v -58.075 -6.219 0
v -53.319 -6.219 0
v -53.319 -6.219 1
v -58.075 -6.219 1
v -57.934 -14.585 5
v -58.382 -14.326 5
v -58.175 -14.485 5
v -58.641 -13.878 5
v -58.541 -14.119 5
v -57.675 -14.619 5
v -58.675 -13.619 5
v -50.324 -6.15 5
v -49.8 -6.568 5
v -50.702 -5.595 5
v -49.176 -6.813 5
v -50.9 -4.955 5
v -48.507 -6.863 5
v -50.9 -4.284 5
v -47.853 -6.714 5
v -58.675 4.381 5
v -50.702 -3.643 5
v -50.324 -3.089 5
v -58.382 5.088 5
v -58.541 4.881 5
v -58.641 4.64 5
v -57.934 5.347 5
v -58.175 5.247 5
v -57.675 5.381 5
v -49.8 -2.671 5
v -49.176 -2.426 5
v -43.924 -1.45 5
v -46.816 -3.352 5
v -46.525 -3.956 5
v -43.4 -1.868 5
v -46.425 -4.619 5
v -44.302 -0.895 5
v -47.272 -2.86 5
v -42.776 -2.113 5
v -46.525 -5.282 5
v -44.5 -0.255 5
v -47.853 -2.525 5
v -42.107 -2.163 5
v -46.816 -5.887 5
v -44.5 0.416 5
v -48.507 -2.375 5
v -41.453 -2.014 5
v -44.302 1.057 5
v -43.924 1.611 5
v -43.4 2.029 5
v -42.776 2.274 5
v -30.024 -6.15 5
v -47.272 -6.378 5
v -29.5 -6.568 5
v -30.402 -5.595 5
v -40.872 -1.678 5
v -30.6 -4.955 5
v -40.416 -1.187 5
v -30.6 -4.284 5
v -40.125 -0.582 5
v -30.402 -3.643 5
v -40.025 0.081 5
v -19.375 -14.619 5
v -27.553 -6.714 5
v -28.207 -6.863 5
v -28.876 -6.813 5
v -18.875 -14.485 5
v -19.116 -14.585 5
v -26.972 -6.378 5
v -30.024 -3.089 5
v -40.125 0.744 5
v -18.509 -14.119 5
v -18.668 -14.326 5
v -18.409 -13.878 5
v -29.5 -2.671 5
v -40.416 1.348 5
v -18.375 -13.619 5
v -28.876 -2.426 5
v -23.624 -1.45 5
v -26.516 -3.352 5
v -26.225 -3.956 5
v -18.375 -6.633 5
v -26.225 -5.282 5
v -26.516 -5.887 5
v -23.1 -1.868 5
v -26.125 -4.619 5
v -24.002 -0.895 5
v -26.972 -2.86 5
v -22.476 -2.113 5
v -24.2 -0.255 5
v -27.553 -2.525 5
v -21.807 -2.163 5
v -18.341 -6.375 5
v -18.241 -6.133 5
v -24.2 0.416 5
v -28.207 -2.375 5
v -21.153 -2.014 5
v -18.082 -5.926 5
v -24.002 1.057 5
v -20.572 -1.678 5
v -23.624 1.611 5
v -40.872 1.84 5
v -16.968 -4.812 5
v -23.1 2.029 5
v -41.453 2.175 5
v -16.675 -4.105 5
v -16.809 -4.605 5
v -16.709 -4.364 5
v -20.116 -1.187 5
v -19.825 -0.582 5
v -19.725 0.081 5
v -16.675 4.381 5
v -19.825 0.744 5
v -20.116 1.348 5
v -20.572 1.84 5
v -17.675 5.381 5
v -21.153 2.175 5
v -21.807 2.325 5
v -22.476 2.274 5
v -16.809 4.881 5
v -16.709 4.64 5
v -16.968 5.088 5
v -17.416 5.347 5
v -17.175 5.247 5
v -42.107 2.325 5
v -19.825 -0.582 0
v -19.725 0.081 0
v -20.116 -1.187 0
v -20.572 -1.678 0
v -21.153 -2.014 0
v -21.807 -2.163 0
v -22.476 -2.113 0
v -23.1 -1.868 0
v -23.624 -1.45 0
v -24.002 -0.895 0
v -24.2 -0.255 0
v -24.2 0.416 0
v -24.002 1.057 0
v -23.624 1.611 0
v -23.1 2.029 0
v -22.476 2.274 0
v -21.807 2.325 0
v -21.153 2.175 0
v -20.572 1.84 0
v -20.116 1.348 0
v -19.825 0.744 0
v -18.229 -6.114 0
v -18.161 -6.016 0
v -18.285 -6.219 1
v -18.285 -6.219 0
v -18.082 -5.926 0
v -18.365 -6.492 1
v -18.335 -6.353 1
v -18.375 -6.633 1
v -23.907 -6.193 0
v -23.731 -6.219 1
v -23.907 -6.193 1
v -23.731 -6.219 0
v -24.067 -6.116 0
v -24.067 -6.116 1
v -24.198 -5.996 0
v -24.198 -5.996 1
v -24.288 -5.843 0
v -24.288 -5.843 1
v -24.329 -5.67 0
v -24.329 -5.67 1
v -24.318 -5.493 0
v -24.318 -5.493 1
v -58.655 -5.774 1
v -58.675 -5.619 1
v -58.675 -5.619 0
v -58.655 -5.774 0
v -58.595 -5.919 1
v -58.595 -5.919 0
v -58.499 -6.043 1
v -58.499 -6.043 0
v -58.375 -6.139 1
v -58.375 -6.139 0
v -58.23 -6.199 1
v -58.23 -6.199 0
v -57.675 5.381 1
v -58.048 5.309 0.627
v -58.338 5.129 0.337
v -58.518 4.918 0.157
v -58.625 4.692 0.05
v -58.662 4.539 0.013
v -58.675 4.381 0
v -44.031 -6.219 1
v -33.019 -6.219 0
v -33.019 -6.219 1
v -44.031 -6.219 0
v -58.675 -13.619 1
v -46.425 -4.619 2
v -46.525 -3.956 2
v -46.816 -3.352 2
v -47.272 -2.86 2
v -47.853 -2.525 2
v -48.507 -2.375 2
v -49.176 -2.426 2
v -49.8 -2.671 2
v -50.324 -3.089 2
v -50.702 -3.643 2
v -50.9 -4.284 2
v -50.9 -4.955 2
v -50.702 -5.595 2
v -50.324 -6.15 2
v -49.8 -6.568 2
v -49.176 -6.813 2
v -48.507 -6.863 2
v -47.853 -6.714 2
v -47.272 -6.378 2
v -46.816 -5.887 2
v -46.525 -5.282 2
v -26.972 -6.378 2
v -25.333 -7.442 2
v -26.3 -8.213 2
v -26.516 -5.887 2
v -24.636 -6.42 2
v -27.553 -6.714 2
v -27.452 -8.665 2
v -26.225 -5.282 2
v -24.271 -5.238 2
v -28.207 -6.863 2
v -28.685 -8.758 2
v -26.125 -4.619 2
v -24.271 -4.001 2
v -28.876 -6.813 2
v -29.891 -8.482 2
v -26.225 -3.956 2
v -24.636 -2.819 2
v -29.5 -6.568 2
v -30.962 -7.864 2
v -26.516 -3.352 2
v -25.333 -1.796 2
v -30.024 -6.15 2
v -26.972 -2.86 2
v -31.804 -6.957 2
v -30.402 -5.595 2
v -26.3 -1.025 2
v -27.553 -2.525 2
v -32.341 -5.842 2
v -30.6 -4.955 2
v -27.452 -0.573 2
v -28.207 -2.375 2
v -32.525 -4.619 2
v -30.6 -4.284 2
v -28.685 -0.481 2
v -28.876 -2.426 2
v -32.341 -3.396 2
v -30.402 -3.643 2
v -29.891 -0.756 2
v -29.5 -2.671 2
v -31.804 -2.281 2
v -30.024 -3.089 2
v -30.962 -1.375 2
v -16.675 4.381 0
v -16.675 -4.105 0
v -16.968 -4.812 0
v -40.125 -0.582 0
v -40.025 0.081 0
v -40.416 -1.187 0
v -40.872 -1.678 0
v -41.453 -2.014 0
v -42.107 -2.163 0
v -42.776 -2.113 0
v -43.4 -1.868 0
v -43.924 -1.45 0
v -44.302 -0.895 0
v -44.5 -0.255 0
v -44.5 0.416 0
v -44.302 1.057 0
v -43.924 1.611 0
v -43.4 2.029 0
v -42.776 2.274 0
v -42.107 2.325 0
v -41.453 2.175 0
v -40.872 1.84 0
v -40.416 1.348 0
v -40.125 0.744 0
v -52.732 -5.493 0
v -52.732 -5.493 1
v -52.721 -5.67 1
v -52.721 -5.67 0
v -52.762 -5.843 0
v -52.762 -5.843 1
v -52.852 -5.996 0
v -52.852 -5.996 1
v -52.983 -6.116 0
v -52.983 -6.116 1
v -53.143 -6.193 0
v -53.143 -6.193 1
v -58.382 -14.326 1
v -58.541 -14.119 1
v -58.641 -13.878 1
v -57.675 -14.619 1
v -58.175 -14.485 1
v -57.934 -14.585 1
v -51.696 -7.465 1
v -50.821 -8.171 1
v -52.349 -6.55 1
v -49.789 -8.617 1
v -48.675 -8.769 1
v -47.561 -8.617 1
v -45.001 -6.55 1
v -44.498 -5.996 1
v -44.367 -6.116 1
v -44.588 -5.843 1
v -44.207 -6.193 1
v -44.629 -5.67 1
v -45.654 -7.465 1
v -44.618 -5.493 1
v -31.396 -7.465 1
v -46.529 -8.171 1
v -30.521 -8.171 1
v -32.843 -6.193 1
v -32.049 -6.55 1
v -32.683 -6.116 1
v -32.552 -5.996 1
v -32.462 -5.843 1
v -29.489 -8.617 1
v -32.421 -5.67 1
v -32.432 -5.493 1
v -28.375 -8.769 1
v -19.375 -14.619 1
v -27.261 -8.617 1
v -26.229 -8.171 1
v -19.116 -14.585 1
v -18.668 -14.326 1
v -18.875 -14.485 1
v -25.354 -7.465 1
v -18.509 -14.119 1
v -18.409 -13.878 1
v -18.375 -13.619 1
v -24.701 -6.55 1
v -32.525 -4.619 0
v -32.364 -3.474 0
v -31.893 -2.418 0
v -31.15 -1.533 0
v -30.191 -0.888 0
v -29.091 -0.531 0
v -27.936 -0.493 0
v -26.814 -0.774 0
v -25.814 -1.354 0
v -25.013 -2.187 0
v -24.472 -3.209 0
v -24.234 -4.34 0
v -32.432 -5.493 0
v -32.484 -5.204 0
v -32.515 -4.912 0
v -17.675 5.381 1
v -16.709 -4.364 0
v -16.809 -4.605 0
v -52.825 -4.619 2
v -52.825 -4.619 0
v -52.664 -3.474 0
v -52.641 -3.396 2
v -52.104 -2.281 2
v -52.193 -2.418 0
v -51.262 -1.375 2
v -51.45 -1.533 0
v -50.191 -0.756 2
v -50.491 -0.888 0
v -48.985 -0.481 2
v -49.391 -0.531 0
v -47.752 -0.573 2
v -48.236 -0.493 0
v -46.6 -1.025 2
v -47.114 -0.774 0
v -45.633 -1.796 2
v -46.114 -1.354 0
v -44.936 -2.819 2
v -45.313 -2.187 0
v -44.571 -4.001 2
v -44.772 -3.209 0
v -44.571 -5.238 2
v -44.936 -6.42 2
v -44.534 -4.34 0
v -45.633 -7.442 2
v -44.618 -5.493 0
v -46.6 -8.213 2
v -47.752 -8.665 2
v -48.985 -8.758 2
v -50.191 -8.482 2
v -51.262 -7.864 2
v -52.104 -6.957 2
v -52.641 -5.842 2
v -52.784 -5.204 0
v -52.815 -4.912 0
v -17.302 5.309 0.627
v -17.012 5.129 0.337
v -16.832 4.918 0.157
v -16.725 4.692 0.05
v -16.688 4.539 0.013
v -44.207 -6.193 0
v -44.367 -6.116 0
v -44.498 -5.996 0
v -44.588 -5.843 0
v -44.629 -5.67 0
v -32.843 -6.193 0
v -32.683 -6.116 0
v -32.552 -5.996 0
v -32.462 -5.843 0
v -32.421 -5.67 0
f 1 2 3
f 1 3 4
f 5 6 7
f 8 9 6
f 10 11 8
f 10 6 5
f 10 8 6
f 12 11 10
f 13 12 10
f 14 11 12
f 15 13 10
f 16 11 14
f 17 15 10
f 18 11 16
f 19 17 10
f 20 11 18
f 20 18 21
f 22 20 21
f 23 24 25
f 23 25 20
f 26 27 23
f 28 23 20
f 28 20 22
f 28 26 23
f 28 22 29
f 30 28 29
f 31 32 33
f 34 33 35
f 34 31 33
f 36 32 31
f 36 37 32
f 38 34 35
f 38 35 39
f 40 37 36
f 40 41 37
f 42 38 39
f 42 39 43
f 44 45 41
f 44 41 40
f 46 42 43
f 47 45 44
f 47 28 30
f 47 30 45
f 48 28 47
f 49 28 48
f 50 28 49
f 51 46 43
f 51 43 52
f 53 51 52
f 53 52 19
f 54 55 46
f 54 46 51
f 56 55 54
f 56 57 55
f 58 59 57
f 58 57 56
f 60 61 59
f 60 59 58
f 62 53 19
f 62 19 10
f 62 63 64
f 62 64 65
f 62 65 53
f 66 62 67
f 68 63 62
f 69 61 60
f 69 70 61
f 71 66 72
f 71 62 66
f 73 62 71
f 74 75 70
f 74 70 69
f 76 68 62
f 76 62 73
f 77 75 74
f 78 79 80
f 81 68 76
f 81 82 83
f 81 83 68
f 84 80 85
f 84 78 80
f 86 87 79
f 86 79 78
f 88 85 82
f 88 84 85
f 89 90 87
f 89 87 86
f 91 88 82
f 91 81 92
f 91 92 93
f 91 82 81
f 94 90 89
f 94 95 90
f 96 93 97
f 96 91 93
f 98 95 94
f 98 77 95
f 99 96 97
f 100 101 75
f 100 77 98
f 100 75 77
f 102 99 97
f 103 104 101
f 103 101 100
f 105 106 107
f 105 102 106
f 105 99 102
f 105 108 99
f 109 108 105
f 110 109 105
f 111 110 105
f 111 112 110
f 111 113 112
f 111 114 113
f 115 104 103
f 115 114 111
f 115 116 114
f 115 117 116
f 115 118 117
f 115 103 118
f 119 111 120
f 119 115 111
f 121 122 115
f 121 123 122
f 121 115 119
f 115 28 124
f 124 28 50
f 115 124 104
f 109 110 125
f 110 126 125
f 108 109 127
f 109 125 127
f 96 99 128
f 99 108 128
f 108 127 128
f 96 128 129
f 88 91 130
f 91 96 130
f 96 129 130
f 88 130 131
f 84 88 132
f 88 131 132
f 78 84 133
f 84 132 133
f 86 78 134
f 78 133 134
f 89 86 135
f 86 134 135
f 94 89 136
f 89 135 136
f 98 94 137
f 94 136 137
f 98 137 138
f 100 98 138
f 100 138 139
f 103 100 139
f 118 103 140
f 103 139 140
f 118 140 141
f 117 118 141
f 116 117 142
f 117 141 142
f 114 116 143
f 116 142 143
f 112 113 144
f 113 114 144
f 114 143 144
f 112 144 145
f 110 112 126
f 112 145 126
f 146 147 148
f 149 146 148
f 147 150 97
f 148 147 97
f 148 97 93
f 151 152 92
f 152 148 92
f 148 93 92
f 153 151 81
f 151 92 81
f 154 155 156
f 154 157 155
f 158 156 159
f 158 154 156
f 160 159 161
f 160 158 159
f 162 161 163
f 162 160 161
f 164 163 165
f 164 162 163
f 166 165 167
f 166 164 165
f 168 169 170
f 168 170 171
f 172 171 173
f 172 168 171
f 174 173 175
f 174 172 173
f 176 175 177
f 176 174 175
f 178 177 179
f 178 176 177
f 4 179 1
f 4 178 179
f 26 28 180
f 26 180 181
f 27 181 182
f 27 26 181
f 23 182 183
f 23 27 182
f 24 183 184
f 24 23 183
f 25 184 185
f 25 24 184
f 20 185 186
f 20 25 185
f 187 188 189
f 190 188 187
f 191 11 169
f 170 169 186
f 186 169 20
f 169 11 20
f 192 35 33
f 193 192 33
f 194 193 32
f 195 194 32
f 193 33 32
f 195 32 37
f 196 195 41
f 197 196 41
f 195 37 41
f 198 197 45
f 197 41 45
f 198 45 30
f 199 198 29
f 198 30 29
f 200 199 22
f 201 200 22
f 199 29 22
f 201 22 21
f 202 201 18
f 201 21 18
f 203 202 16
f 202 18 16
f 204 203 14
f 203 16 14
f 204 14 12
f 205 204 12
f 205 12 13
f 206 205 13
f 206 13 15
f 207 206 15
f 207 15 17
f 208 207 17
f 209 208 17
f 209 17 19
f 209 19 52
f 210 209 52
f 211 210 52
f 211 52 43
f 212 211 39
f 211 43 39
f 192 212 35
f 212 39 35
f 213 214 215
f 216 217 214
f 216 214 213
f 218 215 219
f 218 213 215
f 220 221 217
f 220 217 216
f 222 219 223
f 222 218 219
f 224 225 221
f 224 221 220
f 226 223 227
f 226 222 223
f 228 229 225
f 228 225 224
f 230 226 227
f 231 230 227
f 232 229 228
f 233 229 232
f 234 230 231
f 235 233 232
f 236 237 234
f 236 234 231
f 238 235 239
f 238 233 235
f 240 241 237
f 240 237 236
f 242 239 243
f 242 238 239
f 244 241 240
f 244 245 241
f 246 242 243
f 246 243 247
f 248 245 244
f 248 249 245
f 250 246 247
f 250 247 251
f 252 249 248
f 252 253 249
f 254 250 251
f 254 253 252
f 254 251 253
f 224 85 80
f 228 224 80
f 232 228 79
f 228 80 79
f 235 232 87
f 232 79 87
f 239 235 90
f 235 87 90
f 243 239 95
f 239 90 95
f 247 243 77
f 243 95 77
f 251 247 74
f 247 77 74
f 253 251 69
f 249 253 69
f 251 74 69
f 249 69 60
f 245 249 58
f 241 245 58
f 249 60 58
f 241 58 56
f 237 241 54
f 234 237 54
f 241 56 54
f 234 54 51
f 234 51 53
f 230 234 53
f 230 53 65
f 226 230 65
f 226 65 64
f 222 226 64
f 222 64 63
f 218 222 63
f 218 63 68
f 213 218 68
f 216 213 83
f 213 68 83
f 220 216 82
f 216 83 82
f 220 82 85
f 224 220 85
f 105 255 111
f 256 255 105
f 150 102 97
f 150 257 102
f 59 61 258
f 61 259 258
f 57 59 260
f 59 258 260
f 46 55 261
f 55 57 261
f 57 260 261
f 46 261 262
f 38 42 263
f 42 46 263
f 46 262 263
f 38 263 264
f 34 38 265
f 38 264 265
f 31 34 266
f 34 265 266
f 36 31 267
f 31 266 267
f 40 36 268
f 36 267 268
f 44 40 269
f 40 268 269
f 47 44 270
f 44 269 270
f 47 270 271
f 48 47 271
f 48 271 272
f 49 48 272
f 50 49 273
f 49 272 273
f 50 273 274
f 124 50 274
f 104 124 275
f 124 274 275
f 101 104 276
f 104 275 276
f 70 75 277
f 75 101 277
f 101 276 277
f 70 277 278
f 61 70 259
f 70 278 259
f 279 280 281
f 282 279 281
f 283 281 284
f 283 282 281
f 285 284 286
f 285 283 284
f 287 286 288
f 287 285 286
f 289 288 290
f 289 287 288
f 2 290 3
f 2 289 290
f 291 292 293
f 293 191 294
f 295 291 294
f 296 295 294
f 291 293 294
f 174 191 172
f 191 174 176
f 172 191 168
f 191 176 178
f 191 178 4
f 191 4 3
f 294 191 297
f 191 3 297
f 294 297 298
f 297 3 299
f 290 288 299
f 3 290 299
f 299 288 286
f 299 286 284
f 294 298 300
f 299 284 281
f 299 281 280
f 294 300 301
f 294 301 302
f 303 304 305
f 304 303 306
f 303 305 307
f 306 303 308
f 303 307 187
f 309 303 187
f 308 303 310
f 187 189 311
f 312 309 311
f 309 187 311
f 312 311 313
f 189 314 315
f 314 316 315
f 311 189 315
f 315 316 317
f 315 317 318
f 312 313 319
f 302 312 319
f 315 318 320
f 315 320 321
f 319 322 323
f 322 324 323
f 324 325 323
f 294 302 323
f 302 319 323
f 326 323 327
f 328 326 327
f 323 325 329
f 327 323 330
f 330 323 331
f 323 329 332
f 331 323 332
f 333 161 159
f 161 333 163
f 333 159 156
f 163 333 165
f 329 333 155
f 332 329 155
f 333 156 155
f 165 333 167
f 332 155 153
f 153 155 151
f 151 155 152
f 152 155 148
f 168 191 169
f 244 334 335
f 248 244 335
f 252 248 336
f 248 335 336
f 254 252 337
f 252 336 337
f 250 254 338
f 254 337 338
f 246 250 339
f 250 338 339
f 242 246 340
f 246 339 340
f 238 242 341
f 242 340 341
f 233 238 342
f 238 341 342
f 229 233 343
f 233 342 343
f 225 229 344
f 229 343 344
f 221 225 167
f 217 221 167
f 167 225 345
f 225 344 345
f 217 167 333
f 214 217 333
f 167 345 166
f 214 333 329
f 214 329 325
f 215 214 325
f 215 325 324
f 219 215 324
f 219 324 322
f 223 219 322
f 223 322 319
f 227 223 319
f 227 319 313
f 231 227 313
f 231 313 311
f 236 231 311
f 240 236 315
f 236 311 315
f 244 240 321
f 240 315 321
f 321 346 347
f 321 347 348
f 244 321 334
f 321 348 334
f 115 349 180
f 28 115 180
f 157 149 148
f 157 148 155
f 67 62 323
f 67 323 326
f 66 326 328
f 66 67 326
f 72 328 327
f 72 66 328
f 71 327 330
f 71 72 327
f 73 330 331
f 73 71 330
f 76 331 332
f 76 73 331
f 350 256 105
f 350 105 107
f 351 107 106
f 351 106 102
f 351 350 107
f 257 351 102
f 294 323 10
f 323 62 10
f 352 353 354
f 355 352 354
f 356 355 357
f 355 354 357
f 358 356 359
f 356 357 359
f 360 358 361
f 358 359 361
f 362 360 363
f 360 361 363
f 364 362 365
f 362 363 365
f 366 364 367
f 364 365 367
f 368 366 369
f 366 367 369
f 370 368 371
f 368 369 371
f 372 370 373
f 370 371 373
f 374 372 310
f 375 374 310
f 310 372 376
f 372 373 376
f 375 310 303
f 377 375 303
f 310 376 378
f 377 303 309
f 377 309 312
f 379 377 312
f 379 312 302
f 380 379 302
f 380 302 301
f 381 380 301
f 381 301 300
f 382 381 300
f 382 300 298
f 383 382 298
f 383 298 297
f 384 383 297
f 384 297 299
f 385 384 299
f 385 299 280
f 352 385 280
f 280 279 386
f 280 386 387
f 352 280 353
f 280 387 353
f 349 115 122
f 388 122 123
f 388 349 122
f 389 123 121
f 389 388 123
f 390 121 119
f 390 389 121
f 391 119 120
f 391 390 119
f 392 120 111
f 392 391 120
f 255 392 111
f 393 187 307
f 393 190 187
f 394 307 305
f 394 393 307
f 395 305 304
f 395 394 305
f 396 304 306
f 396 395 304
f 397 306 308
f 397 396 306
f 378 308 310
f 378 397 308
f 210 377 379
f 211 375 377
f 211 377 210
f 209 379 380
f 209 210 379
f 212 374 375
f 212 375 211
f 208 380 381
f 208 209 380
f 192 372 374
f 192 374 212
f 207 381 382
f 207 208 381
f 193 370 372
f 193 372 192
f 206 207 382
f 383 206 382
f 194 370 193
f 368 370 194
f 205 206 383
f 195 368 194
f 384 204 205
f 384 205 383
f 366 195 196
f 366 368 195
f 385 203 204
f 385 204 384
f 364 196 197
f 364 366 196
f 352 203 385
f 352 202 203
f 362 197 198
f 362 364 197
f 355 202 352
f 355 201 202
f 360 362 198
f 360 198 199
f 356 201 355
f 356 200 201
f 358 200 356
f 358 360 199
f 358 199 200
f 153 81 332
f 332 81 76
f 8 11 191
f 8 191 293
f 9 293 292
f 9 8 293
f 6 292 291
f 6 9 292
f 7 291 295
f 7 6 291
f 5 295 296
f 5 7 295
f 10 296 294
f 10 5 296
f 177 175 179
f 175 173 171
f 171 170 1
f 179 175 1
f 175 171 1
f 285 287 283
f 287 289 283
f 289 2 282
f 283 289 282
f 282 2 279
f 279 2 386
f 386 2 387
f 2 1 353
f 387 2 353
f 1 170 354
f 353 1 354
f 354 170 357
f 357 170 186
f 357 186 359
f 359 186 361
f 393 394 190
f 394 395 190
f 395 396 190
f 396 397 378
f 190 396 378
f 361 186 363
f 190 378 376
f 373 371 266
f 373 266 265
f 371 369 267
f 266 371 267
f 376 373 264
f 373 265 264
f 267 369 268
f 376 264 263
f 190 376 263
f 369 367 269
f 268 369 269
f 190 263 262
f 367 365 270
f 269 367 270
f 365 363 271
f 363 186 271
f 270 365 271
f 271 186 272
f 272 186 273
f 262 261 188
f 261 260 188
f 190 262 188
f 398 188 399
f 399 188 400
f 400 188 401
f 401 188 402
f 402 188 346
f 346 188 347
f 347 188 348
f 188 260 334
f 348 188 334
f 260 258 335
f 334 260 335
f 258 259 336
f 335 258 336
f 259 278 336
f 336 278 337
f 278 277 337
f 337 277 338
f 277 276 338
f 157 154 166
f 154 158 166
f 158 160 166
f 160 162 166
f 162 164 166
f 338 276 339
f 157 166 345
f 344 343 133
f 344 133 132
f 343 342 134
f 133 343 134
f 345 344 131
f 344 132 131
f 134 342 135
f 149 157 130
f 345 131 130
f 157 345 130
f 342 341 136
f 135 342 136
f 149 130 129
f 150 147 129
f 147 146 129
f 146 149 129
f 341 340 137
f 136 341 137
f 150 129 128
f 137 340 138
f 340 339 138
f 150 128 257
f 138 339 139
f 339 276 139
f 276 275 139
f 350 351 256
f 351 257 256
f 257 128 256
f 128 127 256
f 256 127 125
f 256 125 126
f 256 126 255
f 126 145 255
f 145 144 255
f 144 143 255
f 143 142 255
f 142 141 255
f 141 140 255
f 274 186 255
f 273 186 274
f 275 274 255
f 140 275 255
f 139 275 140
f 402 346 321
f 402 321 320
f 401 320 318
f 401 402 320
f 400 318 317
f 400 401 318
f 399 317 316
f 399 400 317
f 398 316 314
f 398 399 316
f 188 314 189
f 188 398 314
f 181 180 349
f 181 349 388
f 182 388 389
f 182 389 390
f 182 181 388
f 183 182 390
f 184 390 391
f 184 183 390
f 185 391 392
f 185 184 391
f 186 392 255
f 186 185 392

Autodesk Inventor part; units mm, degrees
ref_plane "YZ Plane" through (0, 0, 0) normal (1, 0, 0) x (0, 1, 0)
ref_plane "XZ Plane" through (0, 0, 0) normal (0, 1, 0) x (-1, 0, 0)
ref_plane "XY Plane" through (0, 0, 0) normal (0, 0, 1) x (1, 0, 0)
sketch "スケッチ1" plane through (0, 0, 0) normal (0, 0, 1) x (1, 0, 0)
  arc A0 (-17.9, -5.9192) -> (-17.6, -6.2192) centre (-17.6, -5.9192) ccw construction
  line L0 (-17.6, -6.2192) -> (-11.8244, -6.2192) construction
  line L1 (-11.8244, -6.2192) -> (-9.5, -2.219) projected
  arc A1 (-9.2172, -2.0192) -> (-9.5, -2.219) centre (-9.2172, -2.3192) ccw projected
  line L2 (-9.2172, -2.0192) -> (-6.9328, -2.0192) projected
  arc A2 (-6.65, -2.219) -> (-6.9328, -2.0192) centre (-6.9328, -2.3192) ccw projected
  line L3 (-6.65, -2.219) -> (-4.3256, -6.2192) projected
  line L4 (-4.3256, -6.2192) -> (8.4756, -6.2192) construction
  line L5 (8.4756, -6.2192) -> (10.8, -2.219) projected
  arc A3 (11.0828, -2.0192) -> (10.8, -2.219) centre (11.0828, -2.3192) ccw projected
  line L6 (11.0828, -2.0192) -> (13.3672, -2.0192) projected
  arc A4 (13.65, -2.219) -> (13.3672, -2.0192) centre (13.3672, -2.3192) ccw projected
  line L7 (13.65, -2.219) -> (15.9744, -6.2192) projected
  line L8 (15.9744, -6.2192) -> (21.25, -6.2192) construction
  arc A5 (21.25, -6.2192) -> (21.55, -5.9192) centre (21.25, -5.9192) ccw construction
  line L9 (21.55, -2.3692) -> (21.55, -5.9192) construction
  arc A6 (21.55, -2.3692) -> (21.25, -2.0692) centre (21.25, -2.3692) ccw construction
  line L10 (21.25, -2.0692) -> (17.65, -2.0692) construction
  arc A7 (17.65, 2.2308) -> (17.65, -2.0692) centre (17.65, 0.0808) ccw construction
  line L11 (17.65, 2.2308) -> (21.25, 2.2308) construction
  arc A8 (21.25, 2.2308) -> (21.55, 2.5308) centre (21.25, 2.5308) ccw construction
  line L12 (21.55, 4.8808) -> (21.55, 2.5308) construction
  line L13 (21.55, 4.8808) -> (-17.9, 4.8808) construction
  line L14 (-17.9, 4.8808) -> (-17.9, -5.9192) construction
  line L15 (1.3, 1.9308) -> (1.3, -1.7692) construction
  arc A9 (1, -2.0692) -> (1.3, -1.7692) centre (1, -1.7692) ccw construction
  line L16 (1, -2.0692) -> (-2.5, -2.0692) construction
  arc A10 (-2.5, 2.2308) -> (-2.5, -2.0692) centre (-2.5, 0.0808) ccw construction
  line L17 (-2.5, 2.2308) -> (1, 2.2308) construction
  arc A11 (1.3, 1.9308) -> (1, 2.2308) centre (1, 1.9308) ccw construction
  line L18 (-17.9, 5.3808) -> (21.55, 5.3808) construction
  circle A12 centre (-0.85, 0.0808) radius 2.15 construction
  line L19 (-0.85, 0.0808) -> (-2.5, 0.0808) construction
  circle A13 centre (-1.675, 0.0808) radius 2.25
  line L20 (64.025, 2.5048) -> (64.025, 91.3712) construction
  line L21 (-65.975, 91.3712) -> (-65.975, 2.5048) construction
  line L22 (64.025, 5.3808) -> (-65.975, 5.3808)
  circle A14 centre (18.625, 0.0808) radius 2.25
  circle A15 centre (38.925, 0.0808) radius 2.25
  circle A16 centre (59.225, 0.0808) radius 2.25
  circle A17 centre (-21.975, 0.0808) radius 2.25
  circle A18 centre (-1.675, 0.0808) radius 2.25
  circle A19 centre (18.625, 0.0808) radius 2.25
  circle A20 centre (38.925, 0.0808) radius 2.25
  circle A21 centre (-42.275, 0.0808) radius 2.25
  circle A22 centre (-21.975, 0.0808) radius 2.25
  circle A23 centre (-1.675, 0.0808) radius 2.25
  circle A24 centre (18.625, 0.0808) radius 2.25
  circle A25 centre (-62.575, 0.0808) radius 2.25
  circle A26 centre (-42.275, 0.0808) radius 2.25
  circle A27 centre (-21.975, 0.0808) radius 2.25
  circle A28 centre (-1.675, 0.0808) radius 2.25
  line L23 (64.025, 5.3808) -> (64.025, -6.2192)
  line L24 (64.025, -6.2192) -> (-65.975, -6.2192)
  line L25 (-65.975, -6.2192) -> (-65.975, 5.3808)
  point P0 (0, 0)
  dimension "d1" = 4.5
  dimension "d4" = 20.3
  dimension "d7" = 20.3
extrude "押し出し1" add sketch "スケッチ1" along normal blind 5 contours L24 L25 L22 L23 L7 A4 L6 A3 L5 L3 A2 L2 A1 L1 | L1 A1 L2 A2 L3 L24 | L5 A3 L6 A4 L7 L24 | A16 | A25
sketch "スケッチ3" plane through (0, 0, 0) normal (0, 0, -1) x (-1, 0, 0)
  line L0 (9.5, -2.219) -> (11.8244, -6.2192) projected
  arc A0 (9.5, -2.219) -> (9.2172, -2.0192) centre (9.2172, -2.3192) ccw projected
  line L1 (6.9328, -2.0192) -> (9.2172, -2.0192) projected
  arc A1 (6.9328, -2.0192) -> (6.65, -2.219) centre (6.9328, -2.3192) ccw projected
  line L2 (4.3256, -6.2192) -> (6.65, -2.219) projected
  line L3 (65.975, -6.2192) -> (-64.025, -6.2192) projected
  point P0 (0, 0)
extrude "押し出し2" cut sketch "スケッチ3" against normal through all
pattern_linear "矩形状パターン1" count 4 spacing 20.3 along (1, 0, 0) count 3 spacing 20.3 along (-1, 0, 0) of "押し出し2"
fillet "フィレット1" radius 1 1 edges at (-0.975, 5.3808, 0)
sketch "スケッチ7" plane through (0, 0, 5) normal (0, 0, 1) x (1, 0, 0)
  line L0 (-52.4244, -6.2192) -> (-50.1, -2.219) projected
  arc A0 (-49.8172, -2.0192) -> (-50.1, -2.219) centre (-49.8172, -2.3192) ccw projected
  line L1 (-49.8172, -2.0192) -> (-47.5328, -2.0192) projected
  arc A1 (-47.25, -2.219) -> (-47.5328, -2.0192) centre (-47.5328, -2.3192) ccw projected
  line L2 (-47.25, -2.219) -> (-44.9256, -6.2192) projected
  line L3 (-32.1244, -6.2192) -> (-29.8, -2.219) projected
  arc A2 (-29.5172, -2.0192) -> (-29.8, -2.219) centre (-29.5172, -2.3192) ccw projected
  line L4 (-29.5172, -2.0192) -> (-27.2328, -2.0192) projected
  arc A3 (-26.95, -2.219) -> (-27.2328, -2.0192) centre (-27.2328, -2.3192) ccw projected
  line L5 (-26.95, -2.219) -> (-24.6256, -6.2192) projected
  line L6 (-11.8244, -6.2192) -> (-9.5, -2.219) projected
  arc A4 (-9.2172, -2.0192) -> (-9.5, -2.219) centre (-9.2172, -2.3192) ccw projected
  line L7 (-9.2172, -2.0192) -> (-6.9328, -2.0192) projected
  arc A5 (-6.65, -2.219) -> (-6.9328, -2.0192) centre (-6.9328, -2.3192) ccw projected
  line L8 (-6.65, -2.219) -> (-4.3256, -6.2192) projected
  line L9 (8.4756, -6.2192) -> (10.8, -2.219) projected
  arc A6 (11.0828, -2.0192) -> (10.8, -2.219) centre (11.0828, -2.3192) ccw projected
  line L10 (11.0828, -2.0192) -> (13.3672, -2.0192) projected
  arc A7 (13.65, -2.219) -> (13.3672, -2.0192) centre (13.3672, -2.3192) ccw projected
  line L11 (13.65, -2.219) -> (15.9744, -6.2192) projected
  line L12 (28.7756, -6.2192) -> (31.1, -2.219) projected
  arc A8 (31.3828, -2.0192) -> (31.1, -2.219) centre (31.3828, -2.3192) ccw projected
  line L13 (31.3828, -2.0192) -> (33.6672, -2.0192) projected
  arc A9 (33.95, -2.219) -> (33.6672, -2.0192) centre (33.6672, -2.3192) ccw projected
  line L14 (33.95, -2.219) -> (36.2744, -6.2192) projected
  line L15 (49.0756, -6.2192) -> (51.4, -2.219) projected
  arc A10 (51.6828, -2.0192) -> (51.4, -2.219) centre (51.6828, -2.3192) ccw projected
  line L16 (51.6828, -2.0192) -> (53.9672, -2.0192) projected
  arc A11 (54.25, -2.219) -> (53.9672, -2.0192) centre (53.9672, -2.3192) ccw projected
  line L17 (54.25, -2.219) -> (56.5744, -6.2192) projected
  line L18 (-52.4244, -6.2192) -> (-44.9256, -6.2192)
  line L19 (-24.6256, -6.2192) -> (-26.95, -2.219) projected
  line L20 (-32.1244, -6.2192) -> (-24.6256, -6.2192)
  line L21 (-9.5, -2.219) -> (-11.8244, -6.2192) projected
  line L22 (-11.8244, -6.2192) -> (-4.3256, -6.2192)
  line L23 (15.9744, -6.2192) -> (8.4756, -6.2192)
  line L24 (36.2744, -6.2192) -> (33.95, -2.219) projected
  line L25 (28.7756, -6.2192) -> (36.2744, -6.2192)
  line L26 (49.0756, -6.2192) -> (56.5744, -6.2192)
  point P0 (0, 0)
extrude "押し出し5" add sketch "スケッチ7" against normal blind 4
sketch "スケッチ8" plane through (0, 0, 5) normal (0, 0, 1) x (1, 0, 0)
  circle A0 centre (-42.275, 0.0808) radius 2.25 projected
  circle A1 centre (-21.975, 0.0808) radius 2.25 projected
  line L0 (-42.275, 0.0808) -> (-21.975, 0.0808) construction
  line L1 (-21.975, 0.0808) -> (-32.125, 0.0808) construction
  line L2 (-48.675, -4.6192) -> (-28.375, -4.6192) construction
  circle A2 centre (-48.675, -4.6192) radius 2.25
  circle A3 centre (-28.375, -4.6192) radius 2.25
  line L3 (-65.975, -6.2192) -> (64.025, -6.2192) projected
  line L4 (-58.675, -6.2192) -> (-18.375, -6.2192)
  line L5 (-18.375, -6.2192) -> (-18.375, -14.6192)
  line L6 (-18.375, -14.6192) -> (-58.675, -14.6192)
  line L7 (-58.675, -14.6192) -> (-58.675, -6.2192)
  line L8 (-65.975, 5.3808) -> (64.025, 5.3808) projected
  line L9 (-27.2328, -2.0192) -> (-29.5172, -2.0192) construction
  point P0 (0, 0)
  point P1 (-38.525, -14.6192)
  point P2 (-18.375, -6.2192)
  point P3 (-38.525, -4.6192)
  point P4 (-28.375, -2.0192)
  point P5 (-28.375, -2.0192)
  dimension "d43" = 20.3
  dimension "d44" = 4.5
  dimension "d45" = 10
  dimension "d46" = 10
  dimension "d53" = 6.4
  dimension "d54" = 10
  dimension "d62" = 4.5
  dimension "d63" = 20.3
extrude "押し出し6" add sketch "スケッチ8" against normal up to surface (4 mm away) contours A2 L3 A3 L5 L6 L7
sketch "スケッチ10" plane through (0, 0, 5) normal (0, 0, 1) x (1, 0, 0)
  arc A0 (-50.2569, -6.2192) -> (-47.0931, -6.2192) centre (-48.675, -4.6192) ccw construction
  arc A1 (-29.9569, -6.2192) -> (-26.7931, -6.2192) centre (-28.375, -4.6192) ccw construction
  circle A2 centre (-48.675, -4.6192) radius 2.25
  circle A3 centre (-28.375, -4.6192) radius 2.25
  point P0 (0, 0)
extrude "押し出し8" cut sketch "スケッチ10" against normal through all
sketch "スケッチ11" plane through (0, 0, 1) normal (0, 0, -1) x (-1, 0, 0)
  circle A0 centre (28.375, -4.6192) radius 2.25 construction
  circle A1 centre (48.675, -4.6192) radius 2.25 construction
  circle A2 centre (28.375, -4.6192) radius 4.15
  circle A3 centre (48.675, -4.6192) radius 4.15
  point P0 (0, 0)
  dimension "d57" = 8.3
extrude "押し出し9" cut sketch "スケッチ11" along normal blind 10 and the other way blind 1
sketch "スケッチ9" plane through (0, 0, 0) normal (0, 0, -1) x (-1, 0, 0)
  line L0 (58.675, -14.6192) -> (58.675, -6.2192) projected
  line L1 (58.675, -14.6192) -> (88.3695, -14.6192)
  line L2 (88.3695, -14.6192) -> (88.3695, 31.2927)
  line L3 (88.3695, 31.2927) -> (58.675, 31.2927)
  line L4 (58.675, 31.2927) -> (58.675, -14.6192)
  line L5 (18.375, -14.6192) -> (-64.2943, -14.6192)
  line L6 (-64.2943, -14.6192) -> (-64.2943, 35.8918)
  line L7 (-64.2943, 35.8918) -> (18.375, 35.8918)
  line L8 (18.375, 35.8918) -> (18.375, -14.6192)
  circle A0 centre (21.975, 0.0808) radius 2.25 construction
  line L9 (65.975, 5.3808) -> (-64.025, 5.3808) construction
  circle A1 centre (21.975, 0.0808) radius 5.3 construction
  line L10 (16.675, 5.3808) -> (16.675, -4.5192)
  line L11 (16.675, -4.5192) -> (18.375, -6.2192)
  line L12 (24.5458, -6.2192) -> (11.8244, -6.2192) projected
  line L13 (16.675, 5.3808) -> (18.375, 5.3808)
  point P0 (0, 0)
  dimension "d64" = 45
extrude "押し出し7" cut sketch "スケッチ9" against normal through all contours L0 L4 L3 L2 L1 | L5 L6 L7 L8 L13 L10 L11
fillet "フィレット2" radius 0.6 5 edges at (-32.2042, -6.2192, 0.5) (-24.5458, -6.2192, 0.5) (-52.5042, -6.2192, 0.5) (-44.8458, -6.2192, 0.5) (-58.675, -6.2192, 0.5)
fillet "フィレット2" radius 1 6 edges at (-58.675, -14.6192, 3) (-18.375, -14.6192, 3) (-58.675, 5.3808, 3) (-16.675, 5.3808, 3) (-16.675, -4.5192, 2.5) (-18.375, -6.2192, 3)
equation "\"d43\" = d63"
properties part number "gpu_hold_plate"
